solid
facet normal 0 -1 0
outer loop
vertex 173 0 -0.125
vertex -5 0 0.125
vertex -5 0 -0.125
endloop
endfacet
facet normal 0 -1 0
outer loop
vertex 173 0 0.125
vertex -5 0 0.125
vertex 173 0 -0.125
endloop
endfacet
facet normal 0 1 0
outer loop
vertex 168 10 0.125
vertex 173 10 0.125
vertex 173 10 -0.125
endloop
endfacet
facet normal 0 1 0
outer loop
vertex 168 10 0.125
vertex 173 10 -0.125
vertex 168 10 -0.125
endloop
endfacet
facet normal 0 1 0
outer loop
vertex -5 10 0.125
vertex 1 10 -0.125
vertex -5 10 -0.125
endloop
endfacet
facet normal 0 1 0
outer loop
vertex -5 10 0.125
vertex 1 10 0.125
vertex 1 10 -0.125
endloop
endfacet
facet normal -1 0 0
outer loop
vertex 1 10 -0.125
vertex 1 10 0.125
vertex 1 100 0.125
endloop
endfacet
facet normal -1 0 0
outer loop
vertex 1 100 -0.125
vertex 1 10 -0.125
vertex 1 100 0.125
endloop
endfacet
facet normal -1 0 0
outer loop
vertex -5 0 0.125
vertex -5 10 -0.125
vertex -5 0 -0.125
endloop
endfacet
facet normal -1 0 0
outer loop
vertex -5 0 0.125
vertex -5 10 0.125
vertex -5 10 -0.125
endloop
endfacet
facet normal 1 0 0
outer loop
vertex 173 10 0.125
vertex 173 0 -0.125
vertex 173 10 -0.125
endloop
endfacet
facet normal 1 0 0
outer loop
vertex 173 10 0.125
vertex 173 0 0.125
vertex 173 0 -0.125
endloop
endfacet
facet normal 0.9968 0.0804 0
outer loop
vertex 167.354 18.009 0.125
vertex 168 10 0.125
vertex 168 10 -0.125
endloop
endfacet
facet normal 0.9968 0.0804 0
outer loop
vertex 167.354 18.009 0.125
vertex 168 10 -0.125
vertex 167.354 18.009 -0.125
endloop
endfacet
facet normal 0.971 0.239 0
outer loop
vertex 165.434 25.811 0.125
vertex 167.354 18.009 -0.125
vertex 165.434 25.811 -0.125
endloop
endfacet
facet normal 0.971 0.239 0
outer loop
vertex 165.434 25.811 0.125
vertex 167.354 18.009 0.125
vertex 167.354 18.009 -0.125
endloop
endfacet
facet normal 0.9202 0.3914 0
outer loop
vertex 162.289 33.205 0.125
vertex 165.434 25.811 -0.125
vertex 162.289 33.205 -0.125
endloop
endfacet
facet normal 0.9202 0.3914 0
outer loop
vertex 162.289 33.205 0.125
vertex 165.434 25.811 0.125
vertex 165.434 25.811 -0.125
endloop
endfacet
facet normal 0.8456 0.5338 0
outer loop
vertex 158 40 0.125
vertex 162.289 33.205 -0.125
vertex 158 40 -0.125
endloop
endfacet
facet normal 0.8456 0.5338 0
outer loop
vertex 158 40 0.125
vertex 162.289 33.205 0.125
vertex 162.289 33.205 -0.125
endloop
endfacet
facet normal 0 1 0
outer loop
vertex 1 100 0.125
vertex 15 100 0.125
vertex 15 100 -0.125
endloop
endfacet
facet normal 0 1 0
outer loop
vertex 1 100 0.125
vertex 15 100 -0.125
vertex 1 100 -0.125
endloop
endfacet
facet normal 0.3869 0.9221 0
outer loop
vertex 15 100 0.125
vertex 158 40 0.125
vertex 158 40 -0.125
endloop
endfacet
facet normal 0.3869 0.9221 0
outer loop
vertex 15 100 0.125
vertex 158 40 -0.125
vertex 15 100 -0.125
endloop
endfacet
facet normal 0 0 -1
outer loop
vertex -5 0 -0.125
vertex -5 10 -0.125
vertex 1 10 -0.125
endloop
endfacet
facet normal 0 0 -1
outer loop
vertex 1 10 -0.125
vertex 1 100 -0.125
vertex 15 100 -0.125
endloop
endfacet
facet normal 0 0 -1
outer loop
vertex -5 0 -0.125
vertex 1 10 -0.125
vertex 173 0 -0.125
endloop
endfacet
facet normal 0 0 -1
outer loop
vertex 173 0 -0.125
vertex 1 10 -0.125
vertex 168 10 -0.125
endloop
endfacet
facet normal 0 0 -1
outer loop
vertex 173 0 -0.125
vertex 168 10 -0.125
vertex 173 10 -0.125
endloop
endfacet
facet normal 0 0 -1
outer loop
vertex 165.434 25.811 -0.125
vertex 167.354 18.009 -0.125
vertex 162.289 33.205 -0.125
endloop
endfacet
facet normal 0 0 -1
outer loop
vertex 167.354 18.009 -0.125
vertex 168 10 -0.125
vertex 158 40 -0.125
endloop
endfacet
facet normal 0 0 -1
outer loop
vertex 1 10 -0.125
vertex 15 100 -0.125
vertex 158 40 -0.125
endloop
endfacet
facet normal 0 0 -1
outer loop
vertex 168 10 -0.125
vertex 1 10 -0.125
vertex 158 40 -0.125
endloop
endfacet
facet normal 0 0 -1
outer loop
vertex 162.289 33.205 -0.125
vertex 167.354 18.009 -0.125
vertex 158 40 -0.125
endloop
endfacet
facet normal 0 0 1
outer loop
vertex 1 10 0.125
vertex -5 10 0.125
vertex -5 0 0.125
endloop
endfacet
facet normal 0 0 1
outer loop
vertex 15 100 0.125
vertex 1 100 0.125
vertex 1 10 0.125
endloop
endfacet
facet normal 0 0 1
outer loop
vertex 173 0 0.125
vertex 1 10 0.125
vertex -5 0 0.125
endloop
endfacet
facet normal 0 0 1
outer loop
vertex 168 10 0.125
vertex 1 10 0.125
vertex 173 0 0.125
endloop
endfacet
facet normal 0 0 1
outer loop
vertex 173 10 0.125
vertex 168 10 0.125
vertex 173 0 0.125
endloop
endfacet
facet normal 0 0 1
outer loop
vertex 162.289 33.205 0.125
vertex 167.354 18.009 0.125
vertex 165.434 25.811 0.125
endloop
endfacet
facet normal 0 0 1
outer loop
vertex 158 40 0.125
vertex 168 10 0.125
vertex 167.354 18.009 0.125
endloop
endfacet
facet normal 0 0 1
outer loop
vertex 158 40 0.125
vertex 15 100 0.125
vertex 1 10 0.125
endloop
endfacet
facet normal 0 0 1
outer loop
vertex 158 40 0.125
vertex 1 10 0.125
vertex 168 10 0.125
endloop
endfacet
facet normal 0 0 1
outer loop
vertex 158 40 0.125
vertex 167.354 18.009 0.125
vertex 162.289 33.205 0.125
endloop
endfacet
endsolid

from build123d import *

# Parameters (mm, degrees)
BOSS_EXTRUDE1_DEPTH = 0.125
SKETCH2_W           = 1
SKETCH2_H           = 90
CUT_EXTRUDE1_DEPTH  = 200.822577553


with BuildPart() as part:
    # Sketch1 → Boss-Extrude1 (new, symmetric)
    with BuildSketch(Plane.XY):
        with BuildLine():
            Line((0, 0), (168, 0))
            Line((168, 0), (173, 0))
            Line((173, 0), (173, 10))
            Line((173, 10), (168, 10))
            ThreePointArc((168, 10), (165.434164903, 25.811388301), (158, 40))
            Line((158, 40), (15, 100))
            Line((15, 100), (0, 100))
            Line((0, 100), (0, 10))
            Line((0, 10), (-5, 10))
            Line((-5, 10), (-5, 0))
            Line((-5, 0), (0, 0))
        make_face()
    extrude(amount=BOSS_EXTRUDE1_DEPTH, both=True)

    # Sketch2 → Cut-Extrude1 (cut, through all)
    with BuildSketch(Plane.XY.offset(0.125)):
        with Locations((0.5, 55)):
            Rectangle(SKETCH2_W, SKETCH2_H)
    extrude(amount=-CUT_EXTRUDE1_DEPTH, mode=Mode.SUBTRACT)


solid = part.part
